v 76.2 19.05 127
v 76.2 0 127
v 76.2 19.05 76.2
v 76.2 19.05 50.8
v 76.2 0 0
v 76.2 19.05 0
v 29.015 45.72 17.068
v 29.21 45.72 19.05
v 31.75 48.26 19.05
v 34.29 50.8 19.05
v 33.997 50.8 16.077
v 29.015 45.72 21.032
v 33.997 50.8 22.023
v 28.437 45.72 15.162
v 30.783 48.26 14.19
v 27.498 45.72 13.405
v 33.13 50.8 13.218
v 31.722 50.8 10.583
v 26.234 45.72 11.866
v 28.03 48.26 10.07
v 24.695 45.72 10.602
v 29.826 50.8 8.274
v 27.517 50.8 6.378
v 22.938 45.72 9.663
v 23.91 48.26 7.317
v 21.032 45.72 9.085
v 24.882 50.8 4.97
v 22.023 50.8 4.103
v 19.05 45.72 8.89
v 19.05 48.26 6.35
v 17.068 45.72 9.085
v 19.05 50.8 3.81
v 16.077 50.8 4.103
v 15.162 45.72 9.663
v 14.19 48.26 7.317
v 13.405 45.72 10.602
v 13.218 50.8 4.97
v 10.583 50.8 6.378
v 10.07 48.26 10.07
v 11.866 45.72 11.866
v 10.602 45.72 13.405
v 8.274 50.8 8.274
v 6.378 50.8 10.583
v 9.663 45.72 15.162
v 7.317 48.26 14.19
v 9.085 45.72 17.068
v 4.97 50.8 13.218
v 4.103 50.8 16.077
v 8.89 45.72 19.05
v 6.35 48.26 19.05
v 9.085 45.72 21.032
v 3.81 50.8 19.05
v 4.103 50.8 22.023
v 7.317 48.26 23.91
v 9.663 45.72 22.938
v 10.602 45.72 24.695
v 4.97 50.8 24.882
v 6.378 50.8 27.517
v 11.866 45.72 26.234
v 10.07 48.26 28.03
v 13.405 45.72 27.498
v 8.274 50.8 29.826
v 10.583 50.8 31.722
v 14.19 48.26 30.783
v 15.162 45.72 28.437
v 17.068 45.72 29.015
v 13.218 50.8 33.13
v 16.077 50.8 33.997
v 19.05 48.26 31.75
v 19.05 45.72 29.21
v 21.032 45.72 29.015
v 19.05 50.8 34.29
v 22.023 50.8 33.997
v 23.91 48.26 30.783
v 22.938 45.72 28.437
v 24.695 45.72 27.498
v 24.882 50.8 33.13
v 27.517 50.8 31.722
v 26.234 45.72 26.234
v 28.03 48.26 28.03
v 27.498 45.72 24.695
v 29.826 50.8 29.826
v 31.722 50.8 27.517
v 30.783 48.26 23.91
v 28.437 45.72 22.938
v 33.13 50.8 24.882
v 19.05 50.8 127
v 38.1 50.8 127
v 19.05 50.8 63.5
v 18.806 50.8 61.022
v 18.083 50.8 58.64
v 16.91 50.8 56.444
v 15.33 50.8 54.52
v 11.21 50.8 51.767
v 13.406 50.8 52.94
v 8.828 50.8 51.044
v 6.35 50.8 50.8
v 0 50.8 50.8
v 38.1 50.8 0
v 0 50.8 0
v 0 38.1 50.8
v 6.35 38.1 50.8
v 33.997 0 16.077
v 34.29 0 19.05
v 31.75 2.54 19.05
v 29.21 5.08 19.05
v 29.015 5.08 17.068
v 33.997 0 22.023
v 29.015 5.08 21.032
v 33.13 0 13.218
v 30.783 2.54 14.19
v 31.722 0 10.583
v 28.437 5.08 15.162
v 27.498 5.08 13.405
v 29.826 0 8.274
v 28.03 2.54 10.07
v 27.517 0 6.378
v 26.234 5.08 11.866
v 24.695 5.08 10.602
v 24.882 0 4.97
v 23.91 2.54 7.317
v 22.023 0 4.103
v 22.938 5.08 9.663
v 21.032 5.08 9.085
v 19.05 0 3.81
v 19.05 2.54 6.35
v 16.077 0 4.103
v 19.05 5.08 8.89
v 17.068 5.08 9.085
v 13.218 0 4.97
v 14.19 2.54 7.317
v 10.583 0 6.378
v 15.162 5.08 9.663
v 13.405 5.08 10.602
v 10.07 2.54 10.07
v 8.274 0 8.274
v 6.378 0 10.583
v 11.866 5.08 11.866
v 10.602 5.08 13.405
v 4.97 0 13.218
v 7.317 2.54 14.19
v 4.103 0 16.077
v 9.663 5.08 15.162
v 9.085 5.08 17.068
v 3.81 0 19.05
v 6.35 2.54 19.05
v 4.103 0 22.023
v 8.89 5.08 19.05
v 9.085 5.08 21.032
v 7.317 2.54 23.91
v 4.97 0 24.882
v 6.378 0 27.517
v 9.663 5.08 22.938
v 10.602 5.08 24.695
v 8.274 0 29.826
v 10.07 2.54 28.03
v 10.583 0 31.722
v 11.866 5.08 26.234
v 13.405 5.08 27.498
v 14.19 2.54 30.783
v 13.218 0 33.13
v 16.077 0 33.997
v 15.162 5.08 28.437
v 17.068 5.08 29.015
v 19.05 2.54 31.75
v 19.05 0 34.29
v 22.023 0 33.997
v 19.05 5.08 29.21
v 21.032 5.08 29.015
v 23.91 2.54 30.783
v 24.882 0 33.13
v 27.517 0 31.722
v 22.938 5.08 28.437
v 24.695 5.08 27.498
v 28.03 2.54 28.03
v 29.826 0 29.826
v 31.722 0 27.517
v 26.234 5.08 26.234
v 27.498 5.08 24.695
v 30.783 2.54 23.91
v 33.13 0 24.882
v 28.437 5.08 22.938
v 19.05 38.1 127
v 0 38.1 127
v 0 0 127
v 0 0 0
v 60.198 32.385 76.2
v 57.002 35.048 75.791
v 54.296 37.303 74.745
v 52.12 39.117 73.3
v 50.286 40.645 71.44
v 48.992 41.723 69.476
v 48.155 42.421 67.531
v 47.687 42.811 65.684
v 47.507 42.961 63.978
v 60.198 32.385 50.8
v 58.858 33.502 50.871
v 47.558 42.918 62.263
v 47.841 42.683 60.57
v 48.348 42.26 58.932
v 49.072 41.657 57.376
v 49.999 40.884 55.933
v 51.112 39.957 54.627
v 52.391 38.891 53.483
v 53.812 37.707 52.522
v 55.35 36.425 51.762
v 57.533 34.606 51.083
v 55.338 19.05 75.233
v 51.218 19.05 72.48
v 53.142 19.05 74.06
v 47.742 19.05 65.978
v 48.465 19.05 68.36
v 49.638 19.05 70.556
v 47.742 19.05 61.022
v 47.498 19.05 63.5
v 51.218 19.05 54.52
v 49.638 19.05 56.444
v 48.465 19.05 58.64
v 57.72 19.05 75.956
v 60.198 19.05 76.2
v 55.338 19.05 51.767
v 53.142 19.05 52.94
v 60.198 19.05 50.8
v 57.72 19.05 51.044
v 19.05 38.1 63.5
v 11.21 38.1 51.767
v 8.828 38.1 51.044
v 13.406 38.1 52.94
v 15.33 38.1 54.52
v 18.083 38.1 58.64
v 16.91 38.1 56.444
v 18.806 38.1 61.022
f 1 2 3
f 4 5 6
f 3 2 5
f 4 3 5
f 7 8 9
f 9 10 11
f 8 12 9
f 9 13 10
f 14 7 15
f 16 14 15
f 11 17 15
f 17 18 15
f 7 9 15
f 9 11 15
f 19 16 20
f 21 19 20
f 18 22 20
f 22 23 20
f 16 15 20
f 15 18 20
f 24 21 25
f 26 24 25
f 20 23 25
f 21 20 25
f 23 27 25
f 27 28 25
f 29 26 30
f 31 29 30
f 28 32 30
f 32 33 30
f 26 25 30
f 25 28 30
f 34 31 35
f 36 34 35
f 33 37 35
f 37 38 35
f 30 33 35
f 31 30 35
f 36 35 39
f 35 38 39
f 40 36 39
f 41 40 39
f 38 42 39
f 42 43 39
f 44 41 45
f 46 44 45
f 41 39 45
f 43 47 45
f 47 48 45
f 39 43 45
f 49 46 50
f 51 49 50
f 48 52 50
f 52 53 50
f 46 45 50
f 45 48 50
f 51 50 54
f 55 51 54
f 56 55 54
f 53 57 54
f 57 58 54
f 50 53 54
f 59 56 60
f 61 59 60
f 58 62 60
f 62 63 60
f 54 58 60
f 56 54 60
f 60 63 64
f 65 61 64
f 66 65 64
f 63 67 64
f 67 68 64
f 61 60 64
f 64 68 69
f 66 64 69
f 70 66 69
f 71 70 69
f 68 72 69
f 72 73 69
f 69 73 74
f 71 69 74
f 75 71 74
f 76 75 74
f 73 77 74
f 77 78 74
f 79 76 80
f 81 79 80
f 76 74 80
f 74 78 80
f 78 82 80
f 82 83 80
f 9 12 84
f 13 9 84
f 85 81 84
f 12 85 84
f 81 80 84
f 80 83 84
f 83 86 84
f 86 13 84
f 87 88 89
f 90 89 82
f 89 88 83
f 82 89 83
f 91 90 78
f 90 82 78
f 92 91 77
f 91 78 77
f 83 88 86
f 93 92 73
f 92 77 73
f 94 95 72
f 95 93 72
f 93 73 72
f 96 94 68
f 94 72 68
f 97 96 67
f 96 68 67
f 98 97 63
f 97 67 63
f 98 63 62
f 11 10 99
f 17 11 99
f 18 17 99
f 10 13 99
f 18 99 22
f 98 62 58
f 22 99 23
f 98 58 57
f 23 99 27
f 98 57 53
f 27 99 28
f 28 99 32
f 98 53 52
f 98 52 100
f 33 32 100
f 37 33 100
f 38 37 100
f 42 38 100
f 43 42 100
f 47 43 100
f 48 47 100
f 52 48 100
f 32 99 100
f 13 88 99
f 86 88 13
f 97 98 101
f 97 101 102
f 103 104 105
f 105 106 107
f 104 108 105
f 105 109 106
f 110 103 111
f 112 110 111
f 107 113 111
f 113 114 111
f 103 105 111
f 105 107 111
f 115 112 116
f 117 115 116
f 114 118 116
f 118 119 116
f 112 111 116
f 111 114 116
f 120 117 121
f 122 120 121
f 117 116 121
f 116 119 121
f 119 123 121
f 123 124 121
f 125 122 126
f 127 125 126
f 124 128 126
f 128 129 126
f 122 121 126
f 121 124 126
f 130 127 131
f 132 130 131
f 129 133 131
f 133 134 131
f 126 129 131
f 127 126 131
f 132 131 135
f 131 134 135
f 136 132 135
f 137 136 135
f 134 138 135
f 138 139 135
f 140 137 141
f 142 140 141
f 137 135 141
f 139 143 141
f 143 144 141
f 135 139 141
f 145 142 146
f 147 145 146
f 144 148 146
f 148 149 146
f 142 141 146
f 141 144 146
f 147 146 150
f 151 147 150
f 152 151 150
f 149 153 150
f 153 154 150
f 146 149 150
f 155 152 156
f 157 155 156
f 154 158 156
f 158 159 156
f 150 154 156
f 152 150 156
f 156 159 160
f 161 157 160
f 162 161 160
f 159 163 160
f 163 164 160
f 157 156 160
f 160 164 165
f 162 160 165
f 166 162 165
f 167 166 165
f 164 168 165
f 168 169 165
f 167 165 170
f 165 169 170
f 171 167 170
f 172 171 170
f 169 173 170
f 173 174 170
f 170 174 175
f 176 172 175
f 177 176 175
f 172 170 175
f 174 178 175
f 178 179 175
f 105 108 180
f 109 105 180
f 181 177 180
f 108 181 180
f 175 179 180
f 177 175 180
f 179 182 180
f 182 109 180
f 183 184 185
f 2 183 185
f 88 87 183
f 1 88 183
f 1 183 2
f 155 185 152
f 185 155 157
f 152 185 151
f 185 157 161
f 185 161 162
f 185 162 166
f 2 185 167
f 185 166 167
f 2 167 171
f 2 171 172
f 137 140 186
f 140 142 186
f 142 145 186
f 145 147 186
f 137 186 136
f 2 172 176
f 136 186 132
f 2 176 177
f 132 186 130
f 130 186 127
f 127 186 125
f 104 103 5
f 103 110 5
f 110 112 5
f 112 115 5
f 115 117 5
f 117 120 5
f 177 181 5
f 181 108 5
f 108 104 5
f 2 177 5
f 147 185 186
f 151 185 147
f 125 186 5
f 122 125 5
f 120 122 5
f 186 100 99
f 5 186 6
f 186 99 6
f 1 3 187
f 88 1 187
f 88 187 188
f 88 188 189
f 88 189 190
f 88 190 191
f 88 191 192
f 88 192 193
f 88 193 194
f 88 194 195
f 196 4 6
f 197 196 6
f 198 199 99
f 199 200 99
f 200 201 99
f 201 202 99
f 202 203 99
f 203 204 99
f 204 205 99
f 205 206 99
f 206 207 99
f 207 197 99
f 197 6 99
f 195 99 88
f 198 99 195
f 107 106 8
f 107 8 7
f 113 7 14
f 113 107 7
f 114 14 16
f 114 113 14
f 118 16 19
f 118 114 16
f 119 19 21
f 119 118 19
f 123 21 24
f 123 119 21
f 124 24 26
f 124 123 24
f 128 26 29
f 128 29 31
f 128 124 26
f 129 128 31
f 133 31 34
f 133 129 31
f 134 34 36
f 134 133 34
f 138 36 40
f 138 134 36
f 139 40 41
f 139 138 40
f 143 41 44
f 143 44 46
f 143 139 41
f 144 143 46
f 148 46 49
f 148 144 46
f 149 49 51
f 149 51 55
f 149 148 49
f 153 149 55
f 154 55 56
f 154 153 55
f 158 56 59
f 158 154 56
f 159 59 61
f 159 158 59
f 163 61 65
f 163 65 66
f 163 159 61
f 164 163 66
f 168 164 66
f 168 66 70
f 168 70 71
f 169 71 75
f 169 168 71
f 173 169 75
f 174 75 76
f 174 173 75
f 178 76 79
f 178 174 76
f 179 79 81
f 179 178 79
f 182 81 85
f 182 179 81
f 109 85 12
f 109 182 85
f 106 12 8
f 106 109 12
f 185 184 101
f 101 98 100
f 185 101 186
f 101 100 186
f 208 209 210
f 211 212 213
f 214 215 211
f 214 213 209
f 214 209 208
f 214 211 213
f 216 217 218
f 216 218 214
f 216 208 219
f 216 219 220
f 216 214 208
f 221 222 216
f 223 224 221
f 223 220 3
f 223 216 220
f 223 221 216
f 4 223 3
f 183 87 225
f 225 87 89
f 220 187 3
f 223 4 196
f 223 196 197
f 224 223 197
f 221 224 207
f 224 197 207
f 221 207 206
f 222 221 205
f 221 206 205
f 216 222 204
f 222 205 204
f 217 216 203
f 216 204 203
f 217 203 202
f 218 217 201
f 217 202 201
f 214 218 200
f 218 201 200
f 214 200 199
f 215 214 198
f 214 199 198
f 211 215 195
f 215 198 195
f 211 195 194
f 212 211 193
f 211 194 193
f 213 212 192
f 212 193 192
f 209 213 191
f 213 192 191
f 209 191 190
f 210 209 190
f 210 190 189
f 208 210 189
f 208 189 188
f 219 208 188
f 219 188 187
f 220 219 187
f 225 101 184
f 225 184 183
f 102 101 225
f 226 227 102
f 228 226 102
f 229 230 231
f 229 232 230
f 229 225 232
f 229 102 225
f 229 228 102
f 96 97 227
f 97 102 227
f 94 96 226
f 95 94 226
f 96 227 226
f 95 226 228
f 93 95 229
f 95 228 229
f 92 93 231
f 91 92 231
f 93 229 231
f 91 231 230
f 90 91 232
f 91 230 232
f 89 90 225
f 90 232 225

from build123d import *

# Parameters (mm, degrees)
BOSS_EXTRUDE1_DEPTH    = 127
CUT_EXTRUDE3_OUTLINE_R = 10.16
CUT_EXTRUDE3_DEPTH     = 50.8
CHAMFER3_SIZE          = 5.08
SKETCH2_W              = 19.05
SKETCH2_H              = 76.2
CUT_EXTRUDE4_DEPTH     = 12.7
FILLET2_R              = 12.7
CUT_EXTRUDE10_DEPTH    = 31.75


# Read off the part's stored shape, not the designer's step: Cut-Extrude3
with BuildPart() as part:
    # Sketch1 → Boss-Extrude1 (new body)
    with BuildSketch(Plane.XY):
        Polygon((0, 0), (76.2, 0), (76.2, 19.05), (38.1, 50.8), (0, 50.8), align=None)
    extrude(amount=BOSS_EXTRUDE1_DEPTH)

    # Cut-Extrude3 outline → Cut-Extrude3 (cut)
    with BuildSketch(Plane(origin=(0, 0, 0), x_dir=(1, 0, 0), z_dir=(0, 1, 0))):
        with Locations((19.05, -19.05)):
            Circle(CUT_EXTRUDE3_OUTLINE_R)
    extrude(amount=CUT_EXTRUDE3_DEPTH, mode=Mode.SUBTRACT)

    # Chamfer3
    chamfer3_edges = [part.edges().sort_by_distance(p)[0] for p in [
        (8.89, 50.8, 19.05),
        (8.89, 0, 19.05),
    ]]
    chamfer(chamfer3_edges, length=CHAMFER3_SIZE)

    # Sketch2 → Cut-Extrude4 (cut)
    with BuildSketch(Plane(origin=(0, 50.8, 0), x_dir=(1, 0, 0), z_dir=(0, 1, 0))):
        with Locations((9.525, -88.9)):
            Rectangle(SKETCH2_W, SKETCH2_H)
    extrude(amount=-CUT_EXTRUDE4_DEPTH, mode=Mode.SUBTRACT)

    # Fillet2
    fillet2_edges = [part.edges().sort_by_distance(p)[0] for p in [
        (19.05, 44.45, 50.8),
    ]]
    fillet(fillet2_edges, radius=FILLET2_R)

    # Sketch3 → Cut-Extrude10 (cut)
    with BuildSketch(Plane(origin=(0, 50.8, 0), x_dir=(1, 0, 0), z_dir=(0, 1, 0))):
        with BuildLine():
            Line((76.2, -50.8), (60.198, -50.8))
            ThreePointArc((60.198, -50.8), (47.498, -63.5), (60.198, -76.2))
            Line((60.198, -76.2), (76.2, -76.2))
            Line((76.2, -76.2), (76.2, -50.8))
        make_face()
    extrude(amount=-CUT_EXTRUDE10_DEPTH, mode=Mode.SUBTRACT)


solid = part.part
